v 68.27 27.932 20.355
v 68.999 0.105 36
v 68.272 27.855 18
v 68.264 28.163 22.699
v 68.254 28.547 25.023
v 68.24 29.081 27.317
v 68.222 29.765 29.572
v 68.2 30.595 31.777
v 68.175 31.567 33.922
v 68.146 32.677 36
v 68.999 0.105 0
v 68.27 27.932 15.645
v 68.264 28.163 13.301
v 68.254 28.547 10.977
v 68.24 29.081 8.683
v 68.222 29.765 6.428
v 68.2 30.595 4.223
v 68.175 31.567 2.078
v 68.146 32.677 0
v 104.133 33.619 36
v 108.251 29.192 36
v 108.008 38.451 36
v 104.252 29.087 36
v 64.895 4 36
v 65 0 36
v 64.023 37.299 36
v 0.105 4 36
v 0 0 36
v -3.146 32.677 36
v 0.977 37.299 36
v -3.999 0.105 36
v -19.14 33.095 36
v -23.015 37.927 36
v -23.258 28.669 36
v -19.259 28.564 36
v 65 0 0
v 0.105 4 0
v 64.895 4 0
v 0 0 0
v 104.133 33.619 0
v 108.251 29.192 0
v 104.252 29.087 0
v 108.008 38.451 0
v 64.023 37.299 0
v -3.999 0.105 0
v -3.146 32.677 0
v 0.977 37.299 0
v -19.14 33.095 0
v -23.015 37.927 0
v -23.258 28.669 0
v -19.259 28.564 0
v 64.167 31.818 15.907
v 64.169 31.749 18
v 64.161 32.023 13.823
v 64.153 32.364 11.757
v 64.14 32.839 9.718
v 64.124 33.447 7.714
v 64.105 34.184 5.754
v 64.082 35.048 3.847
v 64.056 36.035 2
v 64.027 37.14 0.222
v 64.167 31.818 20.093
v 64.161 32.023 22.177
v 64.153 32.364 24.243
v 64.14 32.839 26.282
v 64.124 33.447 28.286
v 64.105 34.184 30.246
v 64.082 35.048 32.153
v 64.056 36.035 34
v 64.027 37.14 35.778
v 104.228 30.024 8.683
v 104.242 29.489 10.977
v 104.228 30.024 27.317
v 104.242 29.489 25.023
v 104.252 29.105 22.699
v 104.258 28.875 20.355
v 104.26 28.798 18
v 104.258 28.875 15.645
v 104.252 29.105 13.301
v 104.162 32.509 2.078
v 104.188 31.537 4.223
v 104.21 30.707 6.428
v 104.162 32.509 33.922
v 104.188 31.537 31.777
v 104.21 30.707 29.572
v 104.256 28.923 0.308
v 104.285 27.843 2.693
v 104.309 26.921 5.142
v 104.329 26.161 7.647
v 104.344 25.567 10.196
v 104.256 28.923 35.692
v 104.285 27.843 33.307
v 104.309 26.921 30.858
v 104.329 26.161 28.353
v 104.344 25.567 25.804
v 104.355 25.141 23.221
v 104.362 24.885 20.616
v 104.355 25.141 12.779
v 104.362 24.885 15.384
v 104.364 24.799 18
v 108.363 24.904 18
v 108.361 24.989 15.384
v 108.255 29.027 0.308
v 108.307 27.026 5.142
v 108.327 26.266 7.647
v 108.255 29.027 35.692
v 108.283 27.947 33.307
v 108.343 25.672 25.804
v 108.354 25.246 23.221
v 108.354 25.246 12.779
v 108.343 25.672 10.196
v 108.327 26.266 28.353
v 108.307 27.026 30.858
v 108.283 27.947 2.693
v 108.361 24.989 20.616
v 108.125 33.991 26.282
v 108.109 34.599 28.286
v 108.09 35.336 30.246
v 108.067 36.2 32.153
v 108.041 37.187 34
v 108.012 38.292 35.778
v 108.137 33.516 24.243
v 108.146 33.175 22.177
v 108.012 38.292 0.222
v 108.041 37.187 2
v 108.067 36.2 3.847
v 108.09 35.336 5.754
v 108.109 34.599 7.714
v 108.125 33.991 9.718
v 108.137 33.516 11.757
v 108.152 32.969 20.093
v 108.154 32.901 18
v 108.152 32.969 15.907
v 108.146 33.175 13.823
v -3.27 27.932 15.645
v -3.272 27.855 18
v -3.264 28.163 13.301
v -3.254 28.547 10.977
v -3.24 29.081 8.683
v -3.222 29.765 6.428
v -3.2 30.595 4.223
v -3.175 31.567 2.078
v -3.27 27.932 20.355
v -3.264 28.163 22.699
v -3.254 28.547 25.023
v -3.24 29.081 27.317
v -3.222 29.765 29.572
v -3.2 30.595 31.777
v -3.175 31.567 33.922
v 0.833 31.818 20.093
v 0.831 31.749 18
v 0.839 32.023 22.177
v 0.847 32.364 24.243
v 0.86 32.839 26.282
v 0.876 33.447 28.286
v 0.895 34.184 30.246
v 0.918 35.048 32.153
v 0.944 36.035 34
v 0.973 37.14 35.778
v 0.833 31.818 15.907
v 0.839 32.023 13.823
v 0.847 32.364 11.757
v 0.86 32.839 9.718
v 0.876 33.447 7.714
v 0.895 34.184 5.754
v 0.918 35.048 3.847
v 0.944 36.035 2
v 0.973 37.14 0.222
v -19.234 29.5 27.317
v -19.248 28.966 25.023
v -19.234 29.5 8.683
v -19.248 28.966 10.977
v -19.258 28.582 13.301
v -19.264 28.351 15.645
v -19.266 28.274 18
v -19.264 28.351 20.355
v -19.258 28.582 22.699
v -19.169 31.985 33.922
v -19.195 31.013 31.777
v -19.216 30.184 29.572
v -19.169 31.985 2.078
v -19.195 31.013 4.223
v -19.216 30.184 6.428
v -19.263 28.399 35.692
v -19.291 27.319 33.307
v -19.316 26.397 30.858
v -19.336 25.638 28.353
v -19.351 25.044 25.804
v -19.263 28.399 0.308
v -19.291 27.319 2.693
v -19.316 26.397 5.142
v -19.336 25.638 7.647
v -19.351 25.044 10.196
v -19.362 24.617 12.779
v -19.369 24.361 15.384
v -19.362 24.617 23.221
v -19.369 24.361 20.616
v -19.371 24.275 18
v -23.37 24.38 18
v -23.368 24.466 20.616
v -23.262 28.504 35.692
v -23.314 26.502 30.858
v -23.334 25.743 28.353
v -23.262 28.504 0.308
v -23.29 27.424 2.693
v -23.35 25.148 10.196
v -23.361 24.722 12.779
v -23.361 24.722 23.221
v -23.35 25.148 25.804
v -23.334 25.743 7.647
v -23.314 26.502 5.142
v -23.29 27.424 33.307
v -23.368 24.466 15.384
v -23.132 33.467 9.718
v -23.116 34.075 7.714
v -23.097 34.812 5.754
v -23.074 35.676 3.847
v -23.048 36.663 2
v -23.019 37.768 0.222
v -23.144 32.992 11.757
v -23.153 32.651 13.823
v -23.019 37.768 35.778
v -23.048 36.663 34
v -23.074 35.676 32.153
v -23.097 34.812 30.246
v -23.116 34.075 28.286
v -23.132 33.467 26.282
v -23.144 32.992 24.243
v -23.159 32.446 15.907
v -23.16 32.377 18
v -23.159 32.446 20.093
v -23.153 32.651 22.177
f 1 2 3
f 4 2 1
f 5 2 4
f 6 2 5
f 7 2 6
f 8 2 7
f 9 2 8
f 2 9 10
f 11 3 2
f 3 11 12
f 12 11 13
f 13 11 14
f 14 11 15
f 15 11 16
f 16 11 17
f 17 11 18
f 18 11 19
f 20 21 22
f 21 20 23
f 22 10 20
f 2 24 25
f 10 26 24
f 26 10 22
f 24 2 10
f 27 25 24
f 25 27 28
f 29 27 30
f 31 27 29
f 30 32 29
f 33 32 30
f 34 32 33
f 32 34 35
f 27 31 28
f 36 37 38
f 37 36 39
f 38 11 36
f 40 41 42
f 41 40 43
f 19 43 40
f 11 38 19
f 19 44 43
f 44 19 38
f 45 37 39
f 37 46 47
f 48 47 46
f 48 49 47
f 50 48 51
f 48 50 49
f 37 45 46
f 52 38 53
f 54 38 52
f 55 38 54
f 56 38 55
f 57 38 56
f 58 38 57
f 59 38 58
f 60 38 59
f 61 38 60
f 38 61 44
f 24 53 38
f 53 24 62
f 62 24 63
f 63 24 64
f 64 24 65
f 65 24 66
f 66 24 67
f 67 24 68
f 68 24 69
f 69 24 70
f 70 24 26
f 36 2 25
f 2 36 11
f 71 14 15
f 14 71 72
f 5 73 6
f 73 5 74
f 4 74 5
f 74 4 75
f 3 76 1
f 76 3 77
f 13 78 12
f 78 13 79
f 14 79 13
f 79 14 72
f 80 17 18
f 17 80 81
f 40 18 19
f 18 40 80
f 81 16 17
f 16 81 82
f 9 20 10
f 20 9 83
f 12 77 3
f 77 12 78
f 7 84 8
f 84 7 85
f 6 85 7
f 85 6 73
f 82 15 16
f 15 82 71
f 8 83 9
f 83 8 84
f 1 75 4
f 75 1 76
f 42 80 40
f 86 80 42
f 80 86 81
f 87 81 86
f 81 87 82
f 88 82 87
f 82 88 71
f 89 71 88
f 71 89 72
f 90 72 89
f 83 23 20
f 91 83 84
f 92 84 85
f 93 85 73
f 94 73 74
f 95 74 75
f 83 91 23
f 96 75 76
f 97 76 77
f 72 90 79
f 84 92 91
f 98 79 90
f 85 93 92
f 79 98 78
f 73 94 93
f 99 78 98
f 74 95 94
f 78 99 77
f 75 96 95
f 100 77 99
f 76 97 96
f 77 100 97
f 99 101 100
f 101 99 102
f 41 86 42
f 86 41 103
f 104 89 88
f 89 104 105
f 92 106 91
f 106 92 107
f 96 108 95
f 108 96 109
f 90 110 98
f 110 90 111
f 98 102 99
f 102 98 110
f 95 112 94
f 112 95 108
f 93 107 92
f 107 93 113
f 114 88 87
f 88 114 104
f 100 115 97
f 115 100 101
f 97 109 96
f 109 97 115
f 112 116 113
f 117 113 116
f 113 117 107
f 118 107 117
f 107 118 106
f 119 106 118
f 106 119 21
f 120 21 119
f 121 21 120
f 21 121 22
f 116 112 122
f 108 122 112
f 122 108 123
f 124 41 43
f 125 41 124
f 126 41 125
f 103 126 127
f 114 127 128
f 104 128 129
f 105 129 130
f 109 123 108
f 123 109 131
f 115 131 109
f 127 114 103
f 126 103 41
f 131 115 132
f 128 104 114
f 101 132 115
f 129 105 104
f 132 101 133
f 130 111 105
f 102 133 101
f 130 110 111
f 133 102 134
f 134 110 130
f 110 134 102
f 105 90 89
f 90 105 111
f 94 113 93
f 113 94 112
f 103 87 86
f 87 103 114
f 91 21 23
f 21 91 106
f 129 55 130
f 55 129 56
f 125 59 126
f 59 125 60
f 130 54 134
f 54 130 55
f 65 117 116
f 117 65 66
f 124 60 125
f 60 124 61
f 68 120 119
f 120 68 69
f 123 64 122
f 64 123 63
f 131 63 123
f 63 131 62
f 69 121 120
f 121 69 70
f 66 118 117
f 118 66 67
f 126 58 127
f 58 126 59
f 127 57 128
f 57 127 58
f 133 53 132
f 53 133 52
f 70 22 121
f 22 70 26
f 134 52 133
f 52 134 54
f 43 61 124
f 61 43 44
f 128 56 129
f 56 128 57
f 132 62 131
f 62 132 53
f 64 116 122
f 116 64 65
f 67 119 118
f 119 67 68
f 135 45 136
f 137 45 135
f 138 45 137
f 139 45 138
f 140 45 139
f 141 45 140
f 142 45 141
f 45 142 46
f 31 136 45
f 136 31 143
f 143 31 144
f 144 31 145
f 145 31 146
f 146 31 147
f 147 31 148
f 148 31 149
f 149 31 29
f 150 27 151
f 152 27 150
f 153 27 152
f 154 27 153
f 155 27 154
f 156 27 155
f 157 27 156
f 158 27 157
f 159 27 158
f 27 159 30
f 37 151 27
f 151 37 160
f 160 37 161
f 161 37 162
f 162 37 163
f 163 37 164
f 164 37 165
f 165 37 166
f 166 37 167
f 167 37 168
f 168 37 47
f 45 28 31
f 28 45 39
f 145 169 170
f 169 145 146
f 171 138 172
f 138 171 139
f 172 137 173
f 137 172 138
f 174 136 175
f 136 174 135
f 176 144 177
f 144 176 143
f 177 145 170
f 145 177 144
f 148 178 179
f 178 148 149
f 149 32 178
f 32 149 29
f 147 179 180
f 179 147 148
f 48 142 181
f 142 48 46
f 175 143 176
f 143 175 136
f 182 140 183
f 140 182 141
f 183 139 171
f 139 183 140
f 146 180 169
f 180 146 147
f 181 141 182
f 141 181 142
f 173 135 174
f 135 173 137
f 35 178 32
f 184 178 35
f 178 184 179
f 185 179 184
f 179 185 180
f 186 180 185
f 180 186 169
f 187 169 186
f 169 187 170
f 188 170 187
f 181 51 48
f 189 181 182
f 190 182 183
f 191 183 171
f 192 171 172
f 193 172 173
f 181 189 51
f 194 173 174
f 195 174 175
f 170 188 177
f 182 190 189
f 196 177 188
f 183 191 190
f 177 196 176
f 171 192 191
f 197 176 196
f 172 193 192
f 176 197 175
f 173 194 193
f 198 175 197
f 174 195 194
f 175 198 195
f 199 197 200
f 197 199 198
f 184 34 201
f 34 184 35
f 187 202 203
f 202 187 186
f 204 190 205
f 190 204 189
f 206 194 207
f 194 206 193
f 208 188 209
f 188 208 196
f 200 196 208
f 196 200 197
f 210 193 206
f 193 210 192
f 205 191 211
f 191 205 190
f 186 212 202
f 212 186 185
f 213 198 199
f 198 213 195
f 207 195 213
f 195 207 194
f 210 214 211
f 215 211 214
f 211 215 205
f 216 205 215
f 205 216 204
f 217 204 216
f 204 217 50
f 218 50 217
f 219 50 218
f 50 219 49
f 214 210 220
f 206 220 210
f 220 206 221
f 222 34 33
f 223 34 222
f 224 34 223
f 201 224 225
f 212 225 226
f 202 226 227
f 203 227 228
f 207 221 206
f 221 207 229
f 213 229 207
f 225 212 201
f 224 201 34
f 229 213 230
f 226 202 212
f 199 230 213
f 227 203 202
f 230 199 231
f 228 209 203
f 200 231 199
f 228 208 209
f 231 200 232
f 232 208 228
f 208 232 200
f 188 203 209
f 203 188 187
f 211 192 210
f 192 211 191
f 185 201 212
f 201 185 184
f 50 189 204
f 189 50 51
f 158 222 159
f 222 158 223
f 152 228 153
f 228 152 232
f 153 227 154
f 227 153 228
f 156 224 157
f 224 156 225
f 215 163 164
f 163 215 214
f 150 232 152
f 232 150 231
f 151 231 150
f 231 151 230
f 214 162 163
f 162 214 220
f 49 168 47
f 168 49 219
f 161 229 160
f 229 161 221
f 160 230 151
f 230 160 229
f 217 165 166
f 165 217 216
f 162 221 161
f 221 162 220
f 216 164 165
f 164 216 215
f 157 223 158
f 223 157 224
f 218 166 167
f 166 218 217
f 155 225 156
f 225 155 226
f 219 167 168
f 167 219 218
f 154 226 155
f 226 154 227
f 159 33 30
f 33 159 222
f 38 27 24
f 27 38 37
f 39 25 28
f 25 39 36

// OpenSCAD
// dual-sided cubicle convenience hook
// for coats and headphones

wall   = 65;  // how deep is the wall we are hanging over
width  = 36;  // how wide is the strip
height = 40;  // how far down do the sides hang
thick  = 4;   // how thick are the strips
pinch  = 1.5; // slight "pinch" into the walls, in degrees
headphone = 40; // depth of the headphone side
coathook  = 20; // depth of the coat hook side

module hook(height, width, depth, thick) {
    intersection() {
        difference(){
            union() {
                cube([thick, height, width]);
                translate([0, height+0.66*width, width/2]) rotate([0, 90, 0])
                    cylinder(h=depth, r=width, center=false, $fn=96);
                translate([depth, height+0.66*width, width/2]) rotate([0, 90, 0])
                        cylinder(h=thick, r=width+thick, center=false, $fn=96);
            }
            translate([0, height+0.66*width, width/2]) rotate([0, 90, 0])
                cylinder(h=depth+thick+10, r=width-thick, center=false, $fn=96);
        }
        cube([depth+thick, height, width]);
    }
}

// top
cube([wall, thick, width]);

// headphone hook
translate([wall, 0, 0])
rotate([0, 0, pinch])
    hook(height, width, headphone, thick);

// coat hook
translate([0, 0, width])
rotate([0, 180, -pinch])
    hook(height, width, coathook, thick);
